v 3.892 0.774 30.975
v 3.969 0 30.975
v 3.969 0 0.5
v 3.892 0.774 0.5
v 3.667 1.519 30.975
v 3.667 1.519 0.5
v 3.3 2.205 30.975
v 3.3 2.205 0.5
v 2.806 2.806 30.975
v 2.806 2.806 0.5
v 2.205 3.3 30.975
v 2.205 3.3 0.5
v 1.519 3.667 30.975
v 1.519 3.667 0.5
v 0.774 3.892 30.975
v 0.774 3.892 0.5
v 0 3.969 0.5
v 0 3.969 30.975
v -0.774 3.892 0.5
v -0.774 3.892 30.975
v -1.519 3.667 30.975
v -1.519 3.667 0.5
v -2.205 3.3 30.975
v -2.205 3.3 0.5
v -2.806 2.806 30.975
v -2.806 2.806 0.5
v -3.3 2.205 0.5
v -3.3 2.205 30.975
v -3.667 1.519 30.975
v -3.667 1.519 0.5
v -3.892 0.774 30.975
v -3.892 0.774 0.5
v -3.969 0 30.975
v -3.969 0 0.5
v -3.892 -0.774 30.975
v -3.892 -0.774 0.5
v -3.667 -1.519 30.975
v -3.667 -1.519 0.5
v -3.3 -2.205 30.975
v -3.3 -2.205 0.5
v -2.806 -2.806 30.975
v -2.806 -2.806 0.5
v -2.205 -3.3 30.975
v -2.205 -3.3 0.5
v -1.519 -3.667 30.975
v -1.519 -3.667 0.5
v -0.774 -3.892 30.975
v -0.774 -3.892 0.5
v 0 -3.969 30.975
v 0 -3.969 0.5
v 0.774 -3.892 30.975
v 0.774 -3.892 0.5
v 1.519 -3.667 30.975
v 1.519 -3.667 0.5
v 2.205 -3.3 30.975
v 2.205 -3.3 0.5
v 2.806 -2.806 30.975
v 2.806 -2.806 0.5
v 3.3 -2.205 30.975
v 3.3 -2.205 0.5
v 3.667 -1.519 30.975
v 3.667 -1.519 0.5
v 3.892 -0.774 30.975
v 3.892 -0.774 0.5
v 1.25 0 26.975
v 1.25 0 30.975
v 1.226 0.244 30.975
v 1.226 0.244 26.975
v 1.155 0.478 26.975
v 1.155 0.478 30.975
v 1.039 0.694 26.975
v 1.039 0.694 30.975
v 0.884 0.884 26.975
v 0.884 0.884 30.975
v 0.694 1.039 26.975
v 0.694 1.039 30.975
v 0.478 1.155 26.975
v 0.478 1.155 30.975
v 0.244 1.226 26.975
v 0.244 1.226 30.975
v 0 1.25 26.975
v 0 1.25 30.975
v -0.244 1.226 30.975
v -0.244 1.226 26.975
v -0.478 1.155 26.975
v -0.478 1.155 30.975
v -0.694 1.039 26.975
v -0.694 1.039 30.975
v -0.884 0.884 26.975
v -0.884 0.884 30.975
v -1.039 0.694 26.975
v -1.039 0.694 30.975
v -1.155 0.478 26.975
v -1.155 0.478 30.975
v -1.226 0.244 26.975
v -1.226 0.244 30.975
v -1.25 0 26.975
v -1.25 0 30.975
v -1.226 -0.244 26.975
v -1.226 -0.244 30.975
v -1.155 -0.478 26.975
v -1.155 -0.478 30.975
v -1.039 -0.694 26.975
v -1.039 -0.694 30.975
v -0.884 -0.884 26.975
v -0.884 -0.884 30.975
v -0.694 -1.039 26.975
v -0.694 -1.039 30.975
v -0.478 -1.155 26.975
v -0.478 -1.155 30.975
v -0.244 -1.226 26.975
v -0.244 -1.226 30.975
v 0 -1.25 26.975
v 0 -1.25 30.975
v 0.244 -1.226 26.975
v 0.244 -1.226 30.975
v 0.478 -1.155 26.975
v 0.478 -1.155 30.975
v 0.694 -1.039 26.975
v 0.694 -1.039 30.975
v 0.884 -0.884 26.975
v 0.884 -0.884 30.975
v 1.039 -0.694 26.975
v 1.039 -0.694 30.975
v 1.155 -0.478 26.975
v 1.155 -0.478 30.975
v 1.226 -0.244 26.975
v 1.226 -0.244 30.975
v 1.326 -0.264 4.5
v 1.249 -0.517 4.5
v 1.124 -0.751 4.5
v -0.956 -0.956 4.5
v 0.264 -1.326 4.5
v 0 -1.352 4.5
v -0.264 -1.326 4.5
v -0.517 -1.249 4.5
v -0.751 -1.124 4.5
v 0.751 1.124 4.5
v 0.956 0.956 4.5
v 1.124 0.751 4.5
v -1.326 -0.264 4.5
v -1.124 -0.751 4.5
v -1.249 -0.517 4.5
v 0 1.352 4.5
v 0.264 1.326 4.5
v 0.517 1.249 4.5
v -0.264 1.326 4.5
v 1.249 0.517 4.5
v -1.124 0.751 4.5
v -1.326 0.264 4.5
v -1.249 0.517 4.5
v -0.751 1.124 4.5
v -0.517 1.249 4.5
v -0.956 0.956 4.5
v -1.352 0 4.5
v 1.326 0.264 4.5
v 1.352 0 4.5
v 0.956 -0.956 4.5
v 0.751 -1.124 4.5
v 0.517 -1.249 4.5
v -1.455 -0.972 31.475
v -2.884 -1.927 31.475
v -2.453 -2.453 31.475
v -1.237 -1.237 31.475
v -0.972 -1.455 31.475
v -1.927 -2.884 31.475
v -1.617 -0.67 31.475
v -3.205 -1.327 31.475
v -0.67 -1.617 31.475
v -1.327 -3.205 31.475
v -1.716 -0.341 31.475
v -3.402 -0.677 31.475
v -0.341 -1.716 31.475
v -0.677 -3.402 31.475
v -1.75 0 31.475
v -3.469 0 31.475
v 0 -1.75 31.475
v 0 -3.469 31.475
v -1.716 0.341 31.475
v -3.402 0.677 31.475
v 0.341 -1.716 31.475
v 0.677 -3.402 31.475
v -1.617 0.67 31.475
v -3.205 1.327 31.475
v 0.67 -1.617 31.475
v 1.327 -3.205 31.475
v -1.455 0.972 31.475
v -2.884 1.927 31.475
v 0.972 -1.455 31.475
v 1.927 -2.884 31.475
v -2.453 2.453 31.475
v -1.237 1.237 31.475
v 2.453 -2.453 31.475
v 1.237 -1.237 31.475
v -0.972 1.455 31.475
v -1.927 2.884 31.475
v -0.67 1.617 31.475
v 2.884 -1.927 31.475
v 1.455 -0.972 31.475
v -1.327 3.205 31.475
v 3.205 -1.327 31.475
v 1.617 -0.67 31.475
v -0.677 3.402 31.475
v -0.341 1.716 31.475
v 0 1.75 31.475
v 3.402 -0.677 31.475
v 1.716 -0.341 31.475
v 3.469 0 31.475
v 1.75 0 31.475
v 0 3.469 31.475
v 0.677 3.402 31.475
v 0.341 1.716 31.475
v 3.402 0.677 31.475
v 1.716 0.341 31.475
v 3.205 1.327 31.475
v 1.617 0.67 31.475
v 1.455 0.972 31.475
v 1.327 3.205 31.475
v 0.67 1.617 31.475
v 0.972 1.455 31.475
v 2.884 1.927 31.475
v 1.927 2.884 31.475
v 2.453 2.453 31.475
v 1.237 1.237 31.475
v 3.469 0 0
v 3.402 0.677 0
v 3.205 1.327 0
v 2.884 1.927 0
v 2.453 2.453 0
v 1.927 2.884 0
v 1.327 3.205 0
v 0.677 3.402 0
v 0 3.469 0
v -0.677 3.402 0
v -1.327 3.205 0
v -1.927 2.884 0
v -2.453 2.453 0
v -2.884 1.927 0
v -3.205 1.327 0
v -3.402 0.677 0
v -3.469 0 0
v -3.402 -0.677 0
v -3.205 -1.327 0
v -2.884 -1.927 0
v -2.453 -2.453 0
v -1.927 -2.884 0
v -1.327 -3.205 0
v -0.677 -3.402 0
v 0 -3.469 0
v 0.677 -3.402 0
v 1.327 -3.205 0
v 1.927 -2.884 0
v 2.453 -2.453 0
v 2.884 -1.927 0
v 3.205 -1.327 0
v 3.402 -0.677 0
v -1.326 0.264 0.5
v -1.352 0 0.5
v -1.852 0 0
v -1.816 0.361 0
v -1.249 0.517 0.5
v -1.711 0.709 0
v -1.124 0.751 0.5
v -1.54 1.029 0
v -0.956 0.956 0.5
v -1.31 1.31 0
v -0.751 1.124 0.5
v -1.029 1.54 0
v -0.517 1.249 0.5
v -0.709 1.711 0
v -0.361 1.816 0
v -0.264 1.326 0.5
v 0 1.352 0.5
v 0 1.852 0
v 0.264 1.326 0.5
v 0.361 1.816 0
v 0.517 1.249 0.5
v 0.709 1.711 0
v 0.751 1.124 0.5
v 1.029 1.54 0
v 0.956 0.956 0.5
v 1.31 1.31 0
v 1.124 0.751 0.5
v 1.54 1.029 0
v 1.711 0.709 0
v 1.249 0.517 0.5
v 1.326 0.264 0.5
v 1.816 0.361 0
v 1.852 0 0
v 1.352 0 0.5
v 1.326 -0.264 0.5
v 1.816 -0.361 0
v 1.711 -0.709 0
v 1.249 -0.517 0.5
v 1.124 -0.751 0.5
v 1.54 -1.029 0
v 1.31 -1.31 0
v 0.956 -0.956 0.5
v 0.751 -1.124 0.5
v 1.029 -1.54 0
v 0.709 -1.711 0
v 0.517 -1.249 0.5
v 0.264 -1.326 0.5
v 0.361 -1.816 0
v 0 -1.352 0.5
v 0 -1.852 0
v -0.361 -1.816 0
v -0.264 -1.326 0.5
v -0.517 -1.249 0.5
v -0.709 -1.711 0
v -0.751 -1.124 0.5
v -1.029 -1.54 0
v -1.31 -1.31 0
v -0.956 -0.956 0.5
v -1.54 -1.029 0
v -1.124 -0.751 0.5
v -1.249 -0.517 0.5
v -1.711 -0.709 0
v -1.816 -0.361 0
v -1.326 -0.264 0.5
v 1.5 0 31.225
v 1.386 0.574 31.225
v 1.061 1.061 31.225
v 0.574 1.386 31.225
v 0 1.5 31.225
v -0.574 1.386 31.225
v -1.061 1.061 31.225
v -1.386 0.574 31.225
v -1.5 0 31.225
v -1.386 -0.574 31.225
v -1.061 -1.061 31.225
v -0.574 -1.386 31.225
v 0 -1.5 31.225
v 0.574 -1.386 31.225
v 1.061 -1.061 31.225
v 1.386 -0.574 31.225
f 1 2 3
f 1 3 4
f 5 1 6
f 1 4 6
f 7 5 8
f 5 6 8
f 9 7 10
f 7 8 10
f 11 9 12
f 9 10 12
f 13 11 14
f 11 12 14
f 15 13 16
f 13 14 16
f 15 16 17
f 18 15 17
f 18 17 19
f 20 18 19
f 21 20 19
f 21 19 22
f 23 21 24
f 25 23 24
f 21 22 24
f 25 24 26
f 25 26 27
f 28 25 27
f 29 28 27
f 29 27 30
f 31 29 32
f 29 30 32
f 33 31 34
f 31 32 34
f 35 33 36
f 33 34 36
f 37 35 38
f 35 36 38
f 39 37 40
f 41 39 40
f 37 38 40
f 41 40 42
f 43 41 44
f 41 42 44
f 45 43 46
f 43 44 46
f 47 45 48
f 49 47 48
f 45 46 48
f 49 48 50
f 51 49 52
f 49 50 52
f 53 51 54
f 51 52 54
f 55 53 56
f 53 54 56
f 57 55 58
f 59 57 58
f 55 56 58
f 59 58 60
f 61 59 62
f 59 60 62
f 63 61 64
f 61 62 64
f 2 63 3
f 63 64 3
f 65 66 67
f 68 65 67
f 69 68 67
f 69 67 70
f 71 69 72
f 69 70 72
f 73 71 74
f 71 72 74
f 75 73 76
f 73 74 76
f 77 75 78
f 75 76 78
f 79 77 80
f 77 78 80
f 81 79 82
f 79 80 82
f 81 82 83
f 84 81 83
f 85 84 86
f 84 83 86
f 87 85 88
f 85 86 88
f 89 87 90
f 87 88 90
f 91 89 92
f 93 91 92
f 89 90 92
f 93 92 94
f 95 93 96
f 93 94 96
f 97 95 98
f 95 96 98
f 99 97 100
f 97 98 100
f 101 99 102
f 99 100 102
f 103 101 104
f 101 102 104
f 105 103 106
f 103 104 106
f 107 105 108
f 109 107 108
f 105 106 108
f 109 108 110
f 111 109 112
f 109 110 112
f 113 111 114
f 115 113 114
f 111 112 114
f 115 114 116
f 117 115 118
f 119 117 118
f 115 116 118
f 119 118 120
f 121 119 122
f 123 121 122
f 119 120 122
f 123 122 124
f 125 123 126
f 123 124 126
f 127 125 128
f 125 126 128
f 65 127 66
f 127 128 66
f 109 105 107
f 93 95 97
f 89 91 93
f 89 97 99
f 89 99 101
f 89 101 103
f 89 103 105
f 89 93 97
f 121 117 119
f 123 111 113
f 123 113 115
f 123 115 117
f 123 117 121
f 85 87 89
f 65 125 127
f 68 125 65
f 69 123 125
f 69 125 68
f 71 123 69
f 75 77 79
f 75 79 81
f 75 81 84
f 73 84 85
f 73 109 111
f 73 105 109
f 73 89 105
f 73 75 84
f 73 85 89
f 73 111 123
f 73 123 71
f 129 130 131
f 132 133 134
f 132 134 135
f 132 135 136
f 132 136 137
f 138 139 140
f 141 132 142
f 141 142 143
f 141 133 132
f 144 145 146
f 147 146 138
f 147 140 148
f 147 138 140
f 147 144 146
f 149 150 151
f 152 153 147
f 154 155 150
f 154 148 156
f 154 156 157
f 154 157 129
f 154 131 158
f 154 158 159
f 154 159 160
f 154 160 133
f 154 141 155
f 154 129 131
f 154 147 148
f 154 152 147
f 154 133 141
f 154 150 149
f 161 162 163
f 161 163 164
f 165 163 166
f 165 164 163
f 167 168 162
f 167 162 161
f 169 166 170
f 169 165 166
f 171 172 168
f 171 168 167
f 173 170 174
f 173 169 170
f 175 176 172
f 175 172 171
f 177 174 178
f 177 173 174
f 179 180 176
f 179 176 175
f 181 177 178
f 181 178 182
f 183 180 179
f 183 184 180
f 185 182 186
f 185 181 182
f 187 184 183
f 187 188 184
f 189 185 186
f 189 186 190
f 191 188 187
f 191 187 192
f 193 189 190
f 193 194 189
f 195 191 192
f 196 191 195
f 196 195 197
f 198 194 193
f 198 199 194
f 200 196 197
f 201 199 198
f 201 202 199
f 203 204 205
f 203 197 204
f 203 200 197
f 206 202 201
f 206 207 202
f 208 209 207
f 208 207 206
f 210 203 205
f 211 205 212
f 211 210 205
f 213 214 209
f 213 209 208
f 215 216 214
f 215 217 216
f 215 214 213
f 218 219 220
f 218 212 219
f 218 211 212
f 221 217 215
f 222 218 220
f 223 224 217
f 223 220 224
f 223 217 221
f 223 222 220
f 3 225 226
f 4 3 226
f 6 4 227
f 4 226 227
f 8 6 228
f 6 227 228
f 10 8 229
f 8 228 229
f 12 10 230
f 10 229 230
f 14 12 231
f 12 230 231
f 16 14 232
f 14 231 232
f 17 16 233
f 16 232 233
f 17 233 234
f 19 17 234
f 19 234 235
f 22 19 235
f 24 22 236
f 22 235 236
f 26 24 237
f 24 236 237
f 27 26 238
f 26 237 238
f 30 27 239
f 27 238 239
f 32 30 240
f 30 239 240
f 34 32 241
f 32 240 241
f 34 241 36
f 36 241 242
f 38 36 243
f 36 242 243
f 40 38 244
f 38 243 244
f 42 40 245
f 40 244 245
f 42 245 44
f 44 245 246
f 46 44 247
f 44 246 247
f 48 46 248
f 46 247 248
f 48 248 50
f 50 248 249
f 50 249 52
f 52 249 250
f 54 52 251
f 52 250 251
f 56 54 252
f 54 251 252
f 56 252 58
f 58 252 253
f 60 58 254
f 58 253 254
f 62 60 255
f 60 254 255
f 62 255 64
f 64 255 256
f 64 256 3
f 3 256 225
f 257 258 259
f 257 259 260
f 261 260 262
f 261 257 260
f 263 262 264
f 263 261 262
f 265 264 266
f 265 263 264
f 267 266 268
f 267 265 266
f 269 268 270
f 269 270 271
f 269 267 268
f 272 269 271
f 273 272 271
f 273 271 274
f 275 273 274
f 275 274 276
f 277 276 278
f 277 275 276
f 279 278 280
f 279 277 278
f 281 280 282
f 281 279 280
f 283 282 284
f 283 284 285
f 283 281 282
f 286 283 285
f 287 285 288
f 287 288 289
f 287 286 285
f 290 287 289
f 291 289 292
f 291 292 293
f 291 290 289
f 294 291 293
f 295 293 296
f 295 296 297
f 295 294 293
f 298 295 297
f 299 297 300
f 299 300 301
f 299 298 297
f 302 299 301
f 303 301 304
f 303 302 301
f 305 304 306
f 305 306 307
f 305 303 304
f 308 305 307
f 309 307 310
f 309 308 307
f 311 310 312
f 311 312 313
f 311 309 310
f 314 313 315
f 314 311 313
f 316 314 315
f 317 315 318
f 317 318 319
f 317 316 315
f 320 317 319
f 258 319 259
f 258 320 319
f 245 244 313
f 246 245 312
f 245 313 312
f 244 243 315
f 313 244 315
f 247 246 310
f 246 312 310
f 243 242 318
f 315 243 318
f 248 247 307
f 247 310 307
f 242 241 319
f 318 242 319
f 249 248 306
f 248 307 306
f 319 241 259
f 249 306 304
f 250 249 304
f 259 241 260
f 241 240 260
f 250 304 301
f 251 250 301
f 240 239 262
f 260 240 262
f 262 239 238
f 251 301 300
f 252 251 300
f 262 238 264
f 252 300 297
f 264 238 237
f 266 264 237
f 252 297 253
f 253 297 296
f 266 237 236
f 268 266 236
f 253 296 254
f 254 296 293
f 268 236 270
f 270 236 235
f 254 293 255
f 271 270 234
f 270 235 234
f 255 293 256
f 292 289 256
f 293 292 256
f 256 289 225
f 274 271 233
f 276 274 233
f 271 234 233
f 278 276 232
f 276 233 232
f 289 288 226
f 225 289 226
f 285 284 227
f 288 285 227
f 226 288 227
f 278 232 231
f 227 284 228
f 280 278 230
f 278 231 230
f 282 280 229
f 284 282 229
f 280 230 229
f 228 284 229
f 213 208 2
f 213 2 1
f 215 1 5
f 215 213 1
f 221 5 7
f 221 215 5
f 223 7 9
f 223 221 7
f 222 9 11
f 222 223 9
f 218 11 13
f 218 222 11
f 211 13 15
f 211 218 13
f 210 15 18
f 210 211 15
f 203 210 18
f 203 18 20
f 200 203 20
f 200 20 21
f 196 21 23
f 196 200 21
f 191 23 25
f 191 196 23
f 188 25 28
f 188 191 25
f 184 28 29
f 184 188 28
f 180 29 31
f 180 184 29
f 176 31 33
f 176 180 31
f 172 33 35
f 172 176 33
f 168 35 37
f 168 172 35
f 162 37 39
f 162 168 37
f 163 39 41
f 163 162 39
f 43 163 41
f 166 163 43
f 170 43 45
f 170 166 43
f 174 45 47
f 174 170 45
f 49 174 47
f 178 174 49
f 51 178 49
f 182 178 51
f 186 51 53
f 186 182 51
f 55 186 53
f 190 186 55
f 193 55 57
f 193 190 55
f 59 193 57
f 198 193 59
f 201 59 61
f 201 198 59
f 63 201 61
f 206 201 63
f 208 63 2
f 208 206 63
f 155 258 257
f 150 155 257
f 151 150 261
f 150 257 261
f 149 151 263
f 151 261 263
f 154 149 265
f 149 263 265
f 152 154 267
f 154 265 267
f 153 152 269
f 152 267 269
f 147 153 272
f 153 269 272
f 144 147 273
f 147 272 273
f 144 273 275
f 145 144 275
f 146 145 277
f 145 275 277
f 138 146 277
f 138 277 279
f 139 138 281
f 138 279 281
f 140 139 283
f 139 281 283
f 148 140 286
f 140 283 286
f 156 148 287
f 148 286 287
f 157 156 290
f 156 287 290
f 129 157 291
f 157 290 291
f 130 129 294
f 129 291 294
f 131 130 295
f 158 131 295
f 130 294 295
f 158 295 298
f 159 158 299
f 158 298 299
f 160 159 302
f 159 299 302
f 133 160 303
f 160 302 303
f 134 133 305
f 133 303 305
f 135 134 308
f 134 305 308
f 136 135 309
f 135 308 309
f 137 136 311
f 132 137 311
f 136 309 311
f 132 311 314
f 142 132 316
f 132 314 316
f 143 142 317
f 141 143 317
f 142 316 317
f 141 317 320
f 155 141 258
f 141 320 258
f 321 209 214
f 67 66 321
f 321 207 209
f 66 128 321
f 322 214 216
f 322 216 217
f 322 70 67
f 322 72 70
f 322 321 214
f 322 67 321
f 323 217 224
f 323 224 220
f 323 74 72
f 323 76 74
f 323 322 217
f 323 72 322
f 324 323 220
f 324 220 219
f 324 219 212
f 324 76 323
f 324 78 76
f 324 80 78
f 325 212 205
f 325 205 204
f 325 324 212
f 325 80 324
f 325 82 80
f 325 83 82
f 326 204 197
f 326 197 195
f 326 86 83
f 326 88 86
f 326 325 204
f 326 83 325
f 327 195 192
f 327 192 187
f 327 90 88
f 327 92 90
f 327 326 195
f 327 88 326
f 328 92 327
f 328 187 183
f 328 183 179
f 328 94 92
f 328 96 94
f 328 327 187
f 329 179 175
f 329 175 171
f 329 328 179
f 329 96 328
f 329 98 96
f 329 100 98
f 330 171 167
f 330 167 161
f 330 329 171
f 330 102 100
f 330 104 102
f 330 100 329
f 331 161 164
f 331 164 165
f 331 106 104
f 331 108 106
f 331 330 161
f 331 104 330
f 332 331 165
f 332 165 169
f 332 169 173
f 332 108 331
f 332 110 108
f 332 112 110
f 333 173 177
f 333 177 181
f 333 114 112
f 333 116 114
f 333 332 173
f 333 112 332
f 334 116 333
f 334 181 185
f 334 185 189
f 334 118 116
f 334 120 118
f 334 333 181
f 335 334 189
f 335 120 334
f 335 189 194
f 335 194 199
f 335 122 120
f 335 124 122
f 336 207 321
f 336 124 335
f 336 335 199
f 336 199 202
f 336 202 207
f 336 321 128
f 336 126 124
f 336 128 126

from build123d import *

# Parameters (mm, degrees)
SKETCH1_R           = 3.96875
BOSS_EXTRUDE1_DEPTH = 31.475
SKETCH3_R           = 1.25
CUT_EXTRUDE1_DEPTH  = 4.5
SKETCH4_R           = 1.352058412
CUT_EXTRUDE2_DEPTH  = 4.5
CHAMFER1_SIZE       = 0.5


with BuildPart() as part:
    # Sketch1 → Boss-Extrude1 (new body)
    with BuildSketch(Plane.XY):
        Circle(SKETCH1_R)
    extrude(amount=BOSS_EXTRUDE1_DEPTH)

    # Sketch3 → Cut-Extrude1 (cut)
    with BuildSketch(Plane.XY.offset(31.475)):
        Circle(SKETCH3_R)
    extrude(amount=-CUT_EXTRUDE1_DEPTH, mode=Mode.SUBTRACT)

    # Sketch4 → Cut-Extrude2 (cut)
    with BuildSketch(Plane(origin=(0, 0, 0), x_dir=(-1, 0, 0), z_dir=(0, 0, -1))):
        Circle(SKETCH4_R)
    extrude(amount=-CUT_EXTRUDE2_DEPTH, mode=Mode.SUBTRACT)

    # Chamfer1
    chamfer1_edges = [part.edges().sort_by_distance(p)[0] for p in [
        (1.352058412, 0, 0),
        (-3.96875, 0, 0),
        (-3.96875, 0, 31.475),
        (-1.25, 0, 31.475),
    ]]
    chamfer(chamfer1_edges, length=CHAMFER1_SIZE)


solid = part.part
